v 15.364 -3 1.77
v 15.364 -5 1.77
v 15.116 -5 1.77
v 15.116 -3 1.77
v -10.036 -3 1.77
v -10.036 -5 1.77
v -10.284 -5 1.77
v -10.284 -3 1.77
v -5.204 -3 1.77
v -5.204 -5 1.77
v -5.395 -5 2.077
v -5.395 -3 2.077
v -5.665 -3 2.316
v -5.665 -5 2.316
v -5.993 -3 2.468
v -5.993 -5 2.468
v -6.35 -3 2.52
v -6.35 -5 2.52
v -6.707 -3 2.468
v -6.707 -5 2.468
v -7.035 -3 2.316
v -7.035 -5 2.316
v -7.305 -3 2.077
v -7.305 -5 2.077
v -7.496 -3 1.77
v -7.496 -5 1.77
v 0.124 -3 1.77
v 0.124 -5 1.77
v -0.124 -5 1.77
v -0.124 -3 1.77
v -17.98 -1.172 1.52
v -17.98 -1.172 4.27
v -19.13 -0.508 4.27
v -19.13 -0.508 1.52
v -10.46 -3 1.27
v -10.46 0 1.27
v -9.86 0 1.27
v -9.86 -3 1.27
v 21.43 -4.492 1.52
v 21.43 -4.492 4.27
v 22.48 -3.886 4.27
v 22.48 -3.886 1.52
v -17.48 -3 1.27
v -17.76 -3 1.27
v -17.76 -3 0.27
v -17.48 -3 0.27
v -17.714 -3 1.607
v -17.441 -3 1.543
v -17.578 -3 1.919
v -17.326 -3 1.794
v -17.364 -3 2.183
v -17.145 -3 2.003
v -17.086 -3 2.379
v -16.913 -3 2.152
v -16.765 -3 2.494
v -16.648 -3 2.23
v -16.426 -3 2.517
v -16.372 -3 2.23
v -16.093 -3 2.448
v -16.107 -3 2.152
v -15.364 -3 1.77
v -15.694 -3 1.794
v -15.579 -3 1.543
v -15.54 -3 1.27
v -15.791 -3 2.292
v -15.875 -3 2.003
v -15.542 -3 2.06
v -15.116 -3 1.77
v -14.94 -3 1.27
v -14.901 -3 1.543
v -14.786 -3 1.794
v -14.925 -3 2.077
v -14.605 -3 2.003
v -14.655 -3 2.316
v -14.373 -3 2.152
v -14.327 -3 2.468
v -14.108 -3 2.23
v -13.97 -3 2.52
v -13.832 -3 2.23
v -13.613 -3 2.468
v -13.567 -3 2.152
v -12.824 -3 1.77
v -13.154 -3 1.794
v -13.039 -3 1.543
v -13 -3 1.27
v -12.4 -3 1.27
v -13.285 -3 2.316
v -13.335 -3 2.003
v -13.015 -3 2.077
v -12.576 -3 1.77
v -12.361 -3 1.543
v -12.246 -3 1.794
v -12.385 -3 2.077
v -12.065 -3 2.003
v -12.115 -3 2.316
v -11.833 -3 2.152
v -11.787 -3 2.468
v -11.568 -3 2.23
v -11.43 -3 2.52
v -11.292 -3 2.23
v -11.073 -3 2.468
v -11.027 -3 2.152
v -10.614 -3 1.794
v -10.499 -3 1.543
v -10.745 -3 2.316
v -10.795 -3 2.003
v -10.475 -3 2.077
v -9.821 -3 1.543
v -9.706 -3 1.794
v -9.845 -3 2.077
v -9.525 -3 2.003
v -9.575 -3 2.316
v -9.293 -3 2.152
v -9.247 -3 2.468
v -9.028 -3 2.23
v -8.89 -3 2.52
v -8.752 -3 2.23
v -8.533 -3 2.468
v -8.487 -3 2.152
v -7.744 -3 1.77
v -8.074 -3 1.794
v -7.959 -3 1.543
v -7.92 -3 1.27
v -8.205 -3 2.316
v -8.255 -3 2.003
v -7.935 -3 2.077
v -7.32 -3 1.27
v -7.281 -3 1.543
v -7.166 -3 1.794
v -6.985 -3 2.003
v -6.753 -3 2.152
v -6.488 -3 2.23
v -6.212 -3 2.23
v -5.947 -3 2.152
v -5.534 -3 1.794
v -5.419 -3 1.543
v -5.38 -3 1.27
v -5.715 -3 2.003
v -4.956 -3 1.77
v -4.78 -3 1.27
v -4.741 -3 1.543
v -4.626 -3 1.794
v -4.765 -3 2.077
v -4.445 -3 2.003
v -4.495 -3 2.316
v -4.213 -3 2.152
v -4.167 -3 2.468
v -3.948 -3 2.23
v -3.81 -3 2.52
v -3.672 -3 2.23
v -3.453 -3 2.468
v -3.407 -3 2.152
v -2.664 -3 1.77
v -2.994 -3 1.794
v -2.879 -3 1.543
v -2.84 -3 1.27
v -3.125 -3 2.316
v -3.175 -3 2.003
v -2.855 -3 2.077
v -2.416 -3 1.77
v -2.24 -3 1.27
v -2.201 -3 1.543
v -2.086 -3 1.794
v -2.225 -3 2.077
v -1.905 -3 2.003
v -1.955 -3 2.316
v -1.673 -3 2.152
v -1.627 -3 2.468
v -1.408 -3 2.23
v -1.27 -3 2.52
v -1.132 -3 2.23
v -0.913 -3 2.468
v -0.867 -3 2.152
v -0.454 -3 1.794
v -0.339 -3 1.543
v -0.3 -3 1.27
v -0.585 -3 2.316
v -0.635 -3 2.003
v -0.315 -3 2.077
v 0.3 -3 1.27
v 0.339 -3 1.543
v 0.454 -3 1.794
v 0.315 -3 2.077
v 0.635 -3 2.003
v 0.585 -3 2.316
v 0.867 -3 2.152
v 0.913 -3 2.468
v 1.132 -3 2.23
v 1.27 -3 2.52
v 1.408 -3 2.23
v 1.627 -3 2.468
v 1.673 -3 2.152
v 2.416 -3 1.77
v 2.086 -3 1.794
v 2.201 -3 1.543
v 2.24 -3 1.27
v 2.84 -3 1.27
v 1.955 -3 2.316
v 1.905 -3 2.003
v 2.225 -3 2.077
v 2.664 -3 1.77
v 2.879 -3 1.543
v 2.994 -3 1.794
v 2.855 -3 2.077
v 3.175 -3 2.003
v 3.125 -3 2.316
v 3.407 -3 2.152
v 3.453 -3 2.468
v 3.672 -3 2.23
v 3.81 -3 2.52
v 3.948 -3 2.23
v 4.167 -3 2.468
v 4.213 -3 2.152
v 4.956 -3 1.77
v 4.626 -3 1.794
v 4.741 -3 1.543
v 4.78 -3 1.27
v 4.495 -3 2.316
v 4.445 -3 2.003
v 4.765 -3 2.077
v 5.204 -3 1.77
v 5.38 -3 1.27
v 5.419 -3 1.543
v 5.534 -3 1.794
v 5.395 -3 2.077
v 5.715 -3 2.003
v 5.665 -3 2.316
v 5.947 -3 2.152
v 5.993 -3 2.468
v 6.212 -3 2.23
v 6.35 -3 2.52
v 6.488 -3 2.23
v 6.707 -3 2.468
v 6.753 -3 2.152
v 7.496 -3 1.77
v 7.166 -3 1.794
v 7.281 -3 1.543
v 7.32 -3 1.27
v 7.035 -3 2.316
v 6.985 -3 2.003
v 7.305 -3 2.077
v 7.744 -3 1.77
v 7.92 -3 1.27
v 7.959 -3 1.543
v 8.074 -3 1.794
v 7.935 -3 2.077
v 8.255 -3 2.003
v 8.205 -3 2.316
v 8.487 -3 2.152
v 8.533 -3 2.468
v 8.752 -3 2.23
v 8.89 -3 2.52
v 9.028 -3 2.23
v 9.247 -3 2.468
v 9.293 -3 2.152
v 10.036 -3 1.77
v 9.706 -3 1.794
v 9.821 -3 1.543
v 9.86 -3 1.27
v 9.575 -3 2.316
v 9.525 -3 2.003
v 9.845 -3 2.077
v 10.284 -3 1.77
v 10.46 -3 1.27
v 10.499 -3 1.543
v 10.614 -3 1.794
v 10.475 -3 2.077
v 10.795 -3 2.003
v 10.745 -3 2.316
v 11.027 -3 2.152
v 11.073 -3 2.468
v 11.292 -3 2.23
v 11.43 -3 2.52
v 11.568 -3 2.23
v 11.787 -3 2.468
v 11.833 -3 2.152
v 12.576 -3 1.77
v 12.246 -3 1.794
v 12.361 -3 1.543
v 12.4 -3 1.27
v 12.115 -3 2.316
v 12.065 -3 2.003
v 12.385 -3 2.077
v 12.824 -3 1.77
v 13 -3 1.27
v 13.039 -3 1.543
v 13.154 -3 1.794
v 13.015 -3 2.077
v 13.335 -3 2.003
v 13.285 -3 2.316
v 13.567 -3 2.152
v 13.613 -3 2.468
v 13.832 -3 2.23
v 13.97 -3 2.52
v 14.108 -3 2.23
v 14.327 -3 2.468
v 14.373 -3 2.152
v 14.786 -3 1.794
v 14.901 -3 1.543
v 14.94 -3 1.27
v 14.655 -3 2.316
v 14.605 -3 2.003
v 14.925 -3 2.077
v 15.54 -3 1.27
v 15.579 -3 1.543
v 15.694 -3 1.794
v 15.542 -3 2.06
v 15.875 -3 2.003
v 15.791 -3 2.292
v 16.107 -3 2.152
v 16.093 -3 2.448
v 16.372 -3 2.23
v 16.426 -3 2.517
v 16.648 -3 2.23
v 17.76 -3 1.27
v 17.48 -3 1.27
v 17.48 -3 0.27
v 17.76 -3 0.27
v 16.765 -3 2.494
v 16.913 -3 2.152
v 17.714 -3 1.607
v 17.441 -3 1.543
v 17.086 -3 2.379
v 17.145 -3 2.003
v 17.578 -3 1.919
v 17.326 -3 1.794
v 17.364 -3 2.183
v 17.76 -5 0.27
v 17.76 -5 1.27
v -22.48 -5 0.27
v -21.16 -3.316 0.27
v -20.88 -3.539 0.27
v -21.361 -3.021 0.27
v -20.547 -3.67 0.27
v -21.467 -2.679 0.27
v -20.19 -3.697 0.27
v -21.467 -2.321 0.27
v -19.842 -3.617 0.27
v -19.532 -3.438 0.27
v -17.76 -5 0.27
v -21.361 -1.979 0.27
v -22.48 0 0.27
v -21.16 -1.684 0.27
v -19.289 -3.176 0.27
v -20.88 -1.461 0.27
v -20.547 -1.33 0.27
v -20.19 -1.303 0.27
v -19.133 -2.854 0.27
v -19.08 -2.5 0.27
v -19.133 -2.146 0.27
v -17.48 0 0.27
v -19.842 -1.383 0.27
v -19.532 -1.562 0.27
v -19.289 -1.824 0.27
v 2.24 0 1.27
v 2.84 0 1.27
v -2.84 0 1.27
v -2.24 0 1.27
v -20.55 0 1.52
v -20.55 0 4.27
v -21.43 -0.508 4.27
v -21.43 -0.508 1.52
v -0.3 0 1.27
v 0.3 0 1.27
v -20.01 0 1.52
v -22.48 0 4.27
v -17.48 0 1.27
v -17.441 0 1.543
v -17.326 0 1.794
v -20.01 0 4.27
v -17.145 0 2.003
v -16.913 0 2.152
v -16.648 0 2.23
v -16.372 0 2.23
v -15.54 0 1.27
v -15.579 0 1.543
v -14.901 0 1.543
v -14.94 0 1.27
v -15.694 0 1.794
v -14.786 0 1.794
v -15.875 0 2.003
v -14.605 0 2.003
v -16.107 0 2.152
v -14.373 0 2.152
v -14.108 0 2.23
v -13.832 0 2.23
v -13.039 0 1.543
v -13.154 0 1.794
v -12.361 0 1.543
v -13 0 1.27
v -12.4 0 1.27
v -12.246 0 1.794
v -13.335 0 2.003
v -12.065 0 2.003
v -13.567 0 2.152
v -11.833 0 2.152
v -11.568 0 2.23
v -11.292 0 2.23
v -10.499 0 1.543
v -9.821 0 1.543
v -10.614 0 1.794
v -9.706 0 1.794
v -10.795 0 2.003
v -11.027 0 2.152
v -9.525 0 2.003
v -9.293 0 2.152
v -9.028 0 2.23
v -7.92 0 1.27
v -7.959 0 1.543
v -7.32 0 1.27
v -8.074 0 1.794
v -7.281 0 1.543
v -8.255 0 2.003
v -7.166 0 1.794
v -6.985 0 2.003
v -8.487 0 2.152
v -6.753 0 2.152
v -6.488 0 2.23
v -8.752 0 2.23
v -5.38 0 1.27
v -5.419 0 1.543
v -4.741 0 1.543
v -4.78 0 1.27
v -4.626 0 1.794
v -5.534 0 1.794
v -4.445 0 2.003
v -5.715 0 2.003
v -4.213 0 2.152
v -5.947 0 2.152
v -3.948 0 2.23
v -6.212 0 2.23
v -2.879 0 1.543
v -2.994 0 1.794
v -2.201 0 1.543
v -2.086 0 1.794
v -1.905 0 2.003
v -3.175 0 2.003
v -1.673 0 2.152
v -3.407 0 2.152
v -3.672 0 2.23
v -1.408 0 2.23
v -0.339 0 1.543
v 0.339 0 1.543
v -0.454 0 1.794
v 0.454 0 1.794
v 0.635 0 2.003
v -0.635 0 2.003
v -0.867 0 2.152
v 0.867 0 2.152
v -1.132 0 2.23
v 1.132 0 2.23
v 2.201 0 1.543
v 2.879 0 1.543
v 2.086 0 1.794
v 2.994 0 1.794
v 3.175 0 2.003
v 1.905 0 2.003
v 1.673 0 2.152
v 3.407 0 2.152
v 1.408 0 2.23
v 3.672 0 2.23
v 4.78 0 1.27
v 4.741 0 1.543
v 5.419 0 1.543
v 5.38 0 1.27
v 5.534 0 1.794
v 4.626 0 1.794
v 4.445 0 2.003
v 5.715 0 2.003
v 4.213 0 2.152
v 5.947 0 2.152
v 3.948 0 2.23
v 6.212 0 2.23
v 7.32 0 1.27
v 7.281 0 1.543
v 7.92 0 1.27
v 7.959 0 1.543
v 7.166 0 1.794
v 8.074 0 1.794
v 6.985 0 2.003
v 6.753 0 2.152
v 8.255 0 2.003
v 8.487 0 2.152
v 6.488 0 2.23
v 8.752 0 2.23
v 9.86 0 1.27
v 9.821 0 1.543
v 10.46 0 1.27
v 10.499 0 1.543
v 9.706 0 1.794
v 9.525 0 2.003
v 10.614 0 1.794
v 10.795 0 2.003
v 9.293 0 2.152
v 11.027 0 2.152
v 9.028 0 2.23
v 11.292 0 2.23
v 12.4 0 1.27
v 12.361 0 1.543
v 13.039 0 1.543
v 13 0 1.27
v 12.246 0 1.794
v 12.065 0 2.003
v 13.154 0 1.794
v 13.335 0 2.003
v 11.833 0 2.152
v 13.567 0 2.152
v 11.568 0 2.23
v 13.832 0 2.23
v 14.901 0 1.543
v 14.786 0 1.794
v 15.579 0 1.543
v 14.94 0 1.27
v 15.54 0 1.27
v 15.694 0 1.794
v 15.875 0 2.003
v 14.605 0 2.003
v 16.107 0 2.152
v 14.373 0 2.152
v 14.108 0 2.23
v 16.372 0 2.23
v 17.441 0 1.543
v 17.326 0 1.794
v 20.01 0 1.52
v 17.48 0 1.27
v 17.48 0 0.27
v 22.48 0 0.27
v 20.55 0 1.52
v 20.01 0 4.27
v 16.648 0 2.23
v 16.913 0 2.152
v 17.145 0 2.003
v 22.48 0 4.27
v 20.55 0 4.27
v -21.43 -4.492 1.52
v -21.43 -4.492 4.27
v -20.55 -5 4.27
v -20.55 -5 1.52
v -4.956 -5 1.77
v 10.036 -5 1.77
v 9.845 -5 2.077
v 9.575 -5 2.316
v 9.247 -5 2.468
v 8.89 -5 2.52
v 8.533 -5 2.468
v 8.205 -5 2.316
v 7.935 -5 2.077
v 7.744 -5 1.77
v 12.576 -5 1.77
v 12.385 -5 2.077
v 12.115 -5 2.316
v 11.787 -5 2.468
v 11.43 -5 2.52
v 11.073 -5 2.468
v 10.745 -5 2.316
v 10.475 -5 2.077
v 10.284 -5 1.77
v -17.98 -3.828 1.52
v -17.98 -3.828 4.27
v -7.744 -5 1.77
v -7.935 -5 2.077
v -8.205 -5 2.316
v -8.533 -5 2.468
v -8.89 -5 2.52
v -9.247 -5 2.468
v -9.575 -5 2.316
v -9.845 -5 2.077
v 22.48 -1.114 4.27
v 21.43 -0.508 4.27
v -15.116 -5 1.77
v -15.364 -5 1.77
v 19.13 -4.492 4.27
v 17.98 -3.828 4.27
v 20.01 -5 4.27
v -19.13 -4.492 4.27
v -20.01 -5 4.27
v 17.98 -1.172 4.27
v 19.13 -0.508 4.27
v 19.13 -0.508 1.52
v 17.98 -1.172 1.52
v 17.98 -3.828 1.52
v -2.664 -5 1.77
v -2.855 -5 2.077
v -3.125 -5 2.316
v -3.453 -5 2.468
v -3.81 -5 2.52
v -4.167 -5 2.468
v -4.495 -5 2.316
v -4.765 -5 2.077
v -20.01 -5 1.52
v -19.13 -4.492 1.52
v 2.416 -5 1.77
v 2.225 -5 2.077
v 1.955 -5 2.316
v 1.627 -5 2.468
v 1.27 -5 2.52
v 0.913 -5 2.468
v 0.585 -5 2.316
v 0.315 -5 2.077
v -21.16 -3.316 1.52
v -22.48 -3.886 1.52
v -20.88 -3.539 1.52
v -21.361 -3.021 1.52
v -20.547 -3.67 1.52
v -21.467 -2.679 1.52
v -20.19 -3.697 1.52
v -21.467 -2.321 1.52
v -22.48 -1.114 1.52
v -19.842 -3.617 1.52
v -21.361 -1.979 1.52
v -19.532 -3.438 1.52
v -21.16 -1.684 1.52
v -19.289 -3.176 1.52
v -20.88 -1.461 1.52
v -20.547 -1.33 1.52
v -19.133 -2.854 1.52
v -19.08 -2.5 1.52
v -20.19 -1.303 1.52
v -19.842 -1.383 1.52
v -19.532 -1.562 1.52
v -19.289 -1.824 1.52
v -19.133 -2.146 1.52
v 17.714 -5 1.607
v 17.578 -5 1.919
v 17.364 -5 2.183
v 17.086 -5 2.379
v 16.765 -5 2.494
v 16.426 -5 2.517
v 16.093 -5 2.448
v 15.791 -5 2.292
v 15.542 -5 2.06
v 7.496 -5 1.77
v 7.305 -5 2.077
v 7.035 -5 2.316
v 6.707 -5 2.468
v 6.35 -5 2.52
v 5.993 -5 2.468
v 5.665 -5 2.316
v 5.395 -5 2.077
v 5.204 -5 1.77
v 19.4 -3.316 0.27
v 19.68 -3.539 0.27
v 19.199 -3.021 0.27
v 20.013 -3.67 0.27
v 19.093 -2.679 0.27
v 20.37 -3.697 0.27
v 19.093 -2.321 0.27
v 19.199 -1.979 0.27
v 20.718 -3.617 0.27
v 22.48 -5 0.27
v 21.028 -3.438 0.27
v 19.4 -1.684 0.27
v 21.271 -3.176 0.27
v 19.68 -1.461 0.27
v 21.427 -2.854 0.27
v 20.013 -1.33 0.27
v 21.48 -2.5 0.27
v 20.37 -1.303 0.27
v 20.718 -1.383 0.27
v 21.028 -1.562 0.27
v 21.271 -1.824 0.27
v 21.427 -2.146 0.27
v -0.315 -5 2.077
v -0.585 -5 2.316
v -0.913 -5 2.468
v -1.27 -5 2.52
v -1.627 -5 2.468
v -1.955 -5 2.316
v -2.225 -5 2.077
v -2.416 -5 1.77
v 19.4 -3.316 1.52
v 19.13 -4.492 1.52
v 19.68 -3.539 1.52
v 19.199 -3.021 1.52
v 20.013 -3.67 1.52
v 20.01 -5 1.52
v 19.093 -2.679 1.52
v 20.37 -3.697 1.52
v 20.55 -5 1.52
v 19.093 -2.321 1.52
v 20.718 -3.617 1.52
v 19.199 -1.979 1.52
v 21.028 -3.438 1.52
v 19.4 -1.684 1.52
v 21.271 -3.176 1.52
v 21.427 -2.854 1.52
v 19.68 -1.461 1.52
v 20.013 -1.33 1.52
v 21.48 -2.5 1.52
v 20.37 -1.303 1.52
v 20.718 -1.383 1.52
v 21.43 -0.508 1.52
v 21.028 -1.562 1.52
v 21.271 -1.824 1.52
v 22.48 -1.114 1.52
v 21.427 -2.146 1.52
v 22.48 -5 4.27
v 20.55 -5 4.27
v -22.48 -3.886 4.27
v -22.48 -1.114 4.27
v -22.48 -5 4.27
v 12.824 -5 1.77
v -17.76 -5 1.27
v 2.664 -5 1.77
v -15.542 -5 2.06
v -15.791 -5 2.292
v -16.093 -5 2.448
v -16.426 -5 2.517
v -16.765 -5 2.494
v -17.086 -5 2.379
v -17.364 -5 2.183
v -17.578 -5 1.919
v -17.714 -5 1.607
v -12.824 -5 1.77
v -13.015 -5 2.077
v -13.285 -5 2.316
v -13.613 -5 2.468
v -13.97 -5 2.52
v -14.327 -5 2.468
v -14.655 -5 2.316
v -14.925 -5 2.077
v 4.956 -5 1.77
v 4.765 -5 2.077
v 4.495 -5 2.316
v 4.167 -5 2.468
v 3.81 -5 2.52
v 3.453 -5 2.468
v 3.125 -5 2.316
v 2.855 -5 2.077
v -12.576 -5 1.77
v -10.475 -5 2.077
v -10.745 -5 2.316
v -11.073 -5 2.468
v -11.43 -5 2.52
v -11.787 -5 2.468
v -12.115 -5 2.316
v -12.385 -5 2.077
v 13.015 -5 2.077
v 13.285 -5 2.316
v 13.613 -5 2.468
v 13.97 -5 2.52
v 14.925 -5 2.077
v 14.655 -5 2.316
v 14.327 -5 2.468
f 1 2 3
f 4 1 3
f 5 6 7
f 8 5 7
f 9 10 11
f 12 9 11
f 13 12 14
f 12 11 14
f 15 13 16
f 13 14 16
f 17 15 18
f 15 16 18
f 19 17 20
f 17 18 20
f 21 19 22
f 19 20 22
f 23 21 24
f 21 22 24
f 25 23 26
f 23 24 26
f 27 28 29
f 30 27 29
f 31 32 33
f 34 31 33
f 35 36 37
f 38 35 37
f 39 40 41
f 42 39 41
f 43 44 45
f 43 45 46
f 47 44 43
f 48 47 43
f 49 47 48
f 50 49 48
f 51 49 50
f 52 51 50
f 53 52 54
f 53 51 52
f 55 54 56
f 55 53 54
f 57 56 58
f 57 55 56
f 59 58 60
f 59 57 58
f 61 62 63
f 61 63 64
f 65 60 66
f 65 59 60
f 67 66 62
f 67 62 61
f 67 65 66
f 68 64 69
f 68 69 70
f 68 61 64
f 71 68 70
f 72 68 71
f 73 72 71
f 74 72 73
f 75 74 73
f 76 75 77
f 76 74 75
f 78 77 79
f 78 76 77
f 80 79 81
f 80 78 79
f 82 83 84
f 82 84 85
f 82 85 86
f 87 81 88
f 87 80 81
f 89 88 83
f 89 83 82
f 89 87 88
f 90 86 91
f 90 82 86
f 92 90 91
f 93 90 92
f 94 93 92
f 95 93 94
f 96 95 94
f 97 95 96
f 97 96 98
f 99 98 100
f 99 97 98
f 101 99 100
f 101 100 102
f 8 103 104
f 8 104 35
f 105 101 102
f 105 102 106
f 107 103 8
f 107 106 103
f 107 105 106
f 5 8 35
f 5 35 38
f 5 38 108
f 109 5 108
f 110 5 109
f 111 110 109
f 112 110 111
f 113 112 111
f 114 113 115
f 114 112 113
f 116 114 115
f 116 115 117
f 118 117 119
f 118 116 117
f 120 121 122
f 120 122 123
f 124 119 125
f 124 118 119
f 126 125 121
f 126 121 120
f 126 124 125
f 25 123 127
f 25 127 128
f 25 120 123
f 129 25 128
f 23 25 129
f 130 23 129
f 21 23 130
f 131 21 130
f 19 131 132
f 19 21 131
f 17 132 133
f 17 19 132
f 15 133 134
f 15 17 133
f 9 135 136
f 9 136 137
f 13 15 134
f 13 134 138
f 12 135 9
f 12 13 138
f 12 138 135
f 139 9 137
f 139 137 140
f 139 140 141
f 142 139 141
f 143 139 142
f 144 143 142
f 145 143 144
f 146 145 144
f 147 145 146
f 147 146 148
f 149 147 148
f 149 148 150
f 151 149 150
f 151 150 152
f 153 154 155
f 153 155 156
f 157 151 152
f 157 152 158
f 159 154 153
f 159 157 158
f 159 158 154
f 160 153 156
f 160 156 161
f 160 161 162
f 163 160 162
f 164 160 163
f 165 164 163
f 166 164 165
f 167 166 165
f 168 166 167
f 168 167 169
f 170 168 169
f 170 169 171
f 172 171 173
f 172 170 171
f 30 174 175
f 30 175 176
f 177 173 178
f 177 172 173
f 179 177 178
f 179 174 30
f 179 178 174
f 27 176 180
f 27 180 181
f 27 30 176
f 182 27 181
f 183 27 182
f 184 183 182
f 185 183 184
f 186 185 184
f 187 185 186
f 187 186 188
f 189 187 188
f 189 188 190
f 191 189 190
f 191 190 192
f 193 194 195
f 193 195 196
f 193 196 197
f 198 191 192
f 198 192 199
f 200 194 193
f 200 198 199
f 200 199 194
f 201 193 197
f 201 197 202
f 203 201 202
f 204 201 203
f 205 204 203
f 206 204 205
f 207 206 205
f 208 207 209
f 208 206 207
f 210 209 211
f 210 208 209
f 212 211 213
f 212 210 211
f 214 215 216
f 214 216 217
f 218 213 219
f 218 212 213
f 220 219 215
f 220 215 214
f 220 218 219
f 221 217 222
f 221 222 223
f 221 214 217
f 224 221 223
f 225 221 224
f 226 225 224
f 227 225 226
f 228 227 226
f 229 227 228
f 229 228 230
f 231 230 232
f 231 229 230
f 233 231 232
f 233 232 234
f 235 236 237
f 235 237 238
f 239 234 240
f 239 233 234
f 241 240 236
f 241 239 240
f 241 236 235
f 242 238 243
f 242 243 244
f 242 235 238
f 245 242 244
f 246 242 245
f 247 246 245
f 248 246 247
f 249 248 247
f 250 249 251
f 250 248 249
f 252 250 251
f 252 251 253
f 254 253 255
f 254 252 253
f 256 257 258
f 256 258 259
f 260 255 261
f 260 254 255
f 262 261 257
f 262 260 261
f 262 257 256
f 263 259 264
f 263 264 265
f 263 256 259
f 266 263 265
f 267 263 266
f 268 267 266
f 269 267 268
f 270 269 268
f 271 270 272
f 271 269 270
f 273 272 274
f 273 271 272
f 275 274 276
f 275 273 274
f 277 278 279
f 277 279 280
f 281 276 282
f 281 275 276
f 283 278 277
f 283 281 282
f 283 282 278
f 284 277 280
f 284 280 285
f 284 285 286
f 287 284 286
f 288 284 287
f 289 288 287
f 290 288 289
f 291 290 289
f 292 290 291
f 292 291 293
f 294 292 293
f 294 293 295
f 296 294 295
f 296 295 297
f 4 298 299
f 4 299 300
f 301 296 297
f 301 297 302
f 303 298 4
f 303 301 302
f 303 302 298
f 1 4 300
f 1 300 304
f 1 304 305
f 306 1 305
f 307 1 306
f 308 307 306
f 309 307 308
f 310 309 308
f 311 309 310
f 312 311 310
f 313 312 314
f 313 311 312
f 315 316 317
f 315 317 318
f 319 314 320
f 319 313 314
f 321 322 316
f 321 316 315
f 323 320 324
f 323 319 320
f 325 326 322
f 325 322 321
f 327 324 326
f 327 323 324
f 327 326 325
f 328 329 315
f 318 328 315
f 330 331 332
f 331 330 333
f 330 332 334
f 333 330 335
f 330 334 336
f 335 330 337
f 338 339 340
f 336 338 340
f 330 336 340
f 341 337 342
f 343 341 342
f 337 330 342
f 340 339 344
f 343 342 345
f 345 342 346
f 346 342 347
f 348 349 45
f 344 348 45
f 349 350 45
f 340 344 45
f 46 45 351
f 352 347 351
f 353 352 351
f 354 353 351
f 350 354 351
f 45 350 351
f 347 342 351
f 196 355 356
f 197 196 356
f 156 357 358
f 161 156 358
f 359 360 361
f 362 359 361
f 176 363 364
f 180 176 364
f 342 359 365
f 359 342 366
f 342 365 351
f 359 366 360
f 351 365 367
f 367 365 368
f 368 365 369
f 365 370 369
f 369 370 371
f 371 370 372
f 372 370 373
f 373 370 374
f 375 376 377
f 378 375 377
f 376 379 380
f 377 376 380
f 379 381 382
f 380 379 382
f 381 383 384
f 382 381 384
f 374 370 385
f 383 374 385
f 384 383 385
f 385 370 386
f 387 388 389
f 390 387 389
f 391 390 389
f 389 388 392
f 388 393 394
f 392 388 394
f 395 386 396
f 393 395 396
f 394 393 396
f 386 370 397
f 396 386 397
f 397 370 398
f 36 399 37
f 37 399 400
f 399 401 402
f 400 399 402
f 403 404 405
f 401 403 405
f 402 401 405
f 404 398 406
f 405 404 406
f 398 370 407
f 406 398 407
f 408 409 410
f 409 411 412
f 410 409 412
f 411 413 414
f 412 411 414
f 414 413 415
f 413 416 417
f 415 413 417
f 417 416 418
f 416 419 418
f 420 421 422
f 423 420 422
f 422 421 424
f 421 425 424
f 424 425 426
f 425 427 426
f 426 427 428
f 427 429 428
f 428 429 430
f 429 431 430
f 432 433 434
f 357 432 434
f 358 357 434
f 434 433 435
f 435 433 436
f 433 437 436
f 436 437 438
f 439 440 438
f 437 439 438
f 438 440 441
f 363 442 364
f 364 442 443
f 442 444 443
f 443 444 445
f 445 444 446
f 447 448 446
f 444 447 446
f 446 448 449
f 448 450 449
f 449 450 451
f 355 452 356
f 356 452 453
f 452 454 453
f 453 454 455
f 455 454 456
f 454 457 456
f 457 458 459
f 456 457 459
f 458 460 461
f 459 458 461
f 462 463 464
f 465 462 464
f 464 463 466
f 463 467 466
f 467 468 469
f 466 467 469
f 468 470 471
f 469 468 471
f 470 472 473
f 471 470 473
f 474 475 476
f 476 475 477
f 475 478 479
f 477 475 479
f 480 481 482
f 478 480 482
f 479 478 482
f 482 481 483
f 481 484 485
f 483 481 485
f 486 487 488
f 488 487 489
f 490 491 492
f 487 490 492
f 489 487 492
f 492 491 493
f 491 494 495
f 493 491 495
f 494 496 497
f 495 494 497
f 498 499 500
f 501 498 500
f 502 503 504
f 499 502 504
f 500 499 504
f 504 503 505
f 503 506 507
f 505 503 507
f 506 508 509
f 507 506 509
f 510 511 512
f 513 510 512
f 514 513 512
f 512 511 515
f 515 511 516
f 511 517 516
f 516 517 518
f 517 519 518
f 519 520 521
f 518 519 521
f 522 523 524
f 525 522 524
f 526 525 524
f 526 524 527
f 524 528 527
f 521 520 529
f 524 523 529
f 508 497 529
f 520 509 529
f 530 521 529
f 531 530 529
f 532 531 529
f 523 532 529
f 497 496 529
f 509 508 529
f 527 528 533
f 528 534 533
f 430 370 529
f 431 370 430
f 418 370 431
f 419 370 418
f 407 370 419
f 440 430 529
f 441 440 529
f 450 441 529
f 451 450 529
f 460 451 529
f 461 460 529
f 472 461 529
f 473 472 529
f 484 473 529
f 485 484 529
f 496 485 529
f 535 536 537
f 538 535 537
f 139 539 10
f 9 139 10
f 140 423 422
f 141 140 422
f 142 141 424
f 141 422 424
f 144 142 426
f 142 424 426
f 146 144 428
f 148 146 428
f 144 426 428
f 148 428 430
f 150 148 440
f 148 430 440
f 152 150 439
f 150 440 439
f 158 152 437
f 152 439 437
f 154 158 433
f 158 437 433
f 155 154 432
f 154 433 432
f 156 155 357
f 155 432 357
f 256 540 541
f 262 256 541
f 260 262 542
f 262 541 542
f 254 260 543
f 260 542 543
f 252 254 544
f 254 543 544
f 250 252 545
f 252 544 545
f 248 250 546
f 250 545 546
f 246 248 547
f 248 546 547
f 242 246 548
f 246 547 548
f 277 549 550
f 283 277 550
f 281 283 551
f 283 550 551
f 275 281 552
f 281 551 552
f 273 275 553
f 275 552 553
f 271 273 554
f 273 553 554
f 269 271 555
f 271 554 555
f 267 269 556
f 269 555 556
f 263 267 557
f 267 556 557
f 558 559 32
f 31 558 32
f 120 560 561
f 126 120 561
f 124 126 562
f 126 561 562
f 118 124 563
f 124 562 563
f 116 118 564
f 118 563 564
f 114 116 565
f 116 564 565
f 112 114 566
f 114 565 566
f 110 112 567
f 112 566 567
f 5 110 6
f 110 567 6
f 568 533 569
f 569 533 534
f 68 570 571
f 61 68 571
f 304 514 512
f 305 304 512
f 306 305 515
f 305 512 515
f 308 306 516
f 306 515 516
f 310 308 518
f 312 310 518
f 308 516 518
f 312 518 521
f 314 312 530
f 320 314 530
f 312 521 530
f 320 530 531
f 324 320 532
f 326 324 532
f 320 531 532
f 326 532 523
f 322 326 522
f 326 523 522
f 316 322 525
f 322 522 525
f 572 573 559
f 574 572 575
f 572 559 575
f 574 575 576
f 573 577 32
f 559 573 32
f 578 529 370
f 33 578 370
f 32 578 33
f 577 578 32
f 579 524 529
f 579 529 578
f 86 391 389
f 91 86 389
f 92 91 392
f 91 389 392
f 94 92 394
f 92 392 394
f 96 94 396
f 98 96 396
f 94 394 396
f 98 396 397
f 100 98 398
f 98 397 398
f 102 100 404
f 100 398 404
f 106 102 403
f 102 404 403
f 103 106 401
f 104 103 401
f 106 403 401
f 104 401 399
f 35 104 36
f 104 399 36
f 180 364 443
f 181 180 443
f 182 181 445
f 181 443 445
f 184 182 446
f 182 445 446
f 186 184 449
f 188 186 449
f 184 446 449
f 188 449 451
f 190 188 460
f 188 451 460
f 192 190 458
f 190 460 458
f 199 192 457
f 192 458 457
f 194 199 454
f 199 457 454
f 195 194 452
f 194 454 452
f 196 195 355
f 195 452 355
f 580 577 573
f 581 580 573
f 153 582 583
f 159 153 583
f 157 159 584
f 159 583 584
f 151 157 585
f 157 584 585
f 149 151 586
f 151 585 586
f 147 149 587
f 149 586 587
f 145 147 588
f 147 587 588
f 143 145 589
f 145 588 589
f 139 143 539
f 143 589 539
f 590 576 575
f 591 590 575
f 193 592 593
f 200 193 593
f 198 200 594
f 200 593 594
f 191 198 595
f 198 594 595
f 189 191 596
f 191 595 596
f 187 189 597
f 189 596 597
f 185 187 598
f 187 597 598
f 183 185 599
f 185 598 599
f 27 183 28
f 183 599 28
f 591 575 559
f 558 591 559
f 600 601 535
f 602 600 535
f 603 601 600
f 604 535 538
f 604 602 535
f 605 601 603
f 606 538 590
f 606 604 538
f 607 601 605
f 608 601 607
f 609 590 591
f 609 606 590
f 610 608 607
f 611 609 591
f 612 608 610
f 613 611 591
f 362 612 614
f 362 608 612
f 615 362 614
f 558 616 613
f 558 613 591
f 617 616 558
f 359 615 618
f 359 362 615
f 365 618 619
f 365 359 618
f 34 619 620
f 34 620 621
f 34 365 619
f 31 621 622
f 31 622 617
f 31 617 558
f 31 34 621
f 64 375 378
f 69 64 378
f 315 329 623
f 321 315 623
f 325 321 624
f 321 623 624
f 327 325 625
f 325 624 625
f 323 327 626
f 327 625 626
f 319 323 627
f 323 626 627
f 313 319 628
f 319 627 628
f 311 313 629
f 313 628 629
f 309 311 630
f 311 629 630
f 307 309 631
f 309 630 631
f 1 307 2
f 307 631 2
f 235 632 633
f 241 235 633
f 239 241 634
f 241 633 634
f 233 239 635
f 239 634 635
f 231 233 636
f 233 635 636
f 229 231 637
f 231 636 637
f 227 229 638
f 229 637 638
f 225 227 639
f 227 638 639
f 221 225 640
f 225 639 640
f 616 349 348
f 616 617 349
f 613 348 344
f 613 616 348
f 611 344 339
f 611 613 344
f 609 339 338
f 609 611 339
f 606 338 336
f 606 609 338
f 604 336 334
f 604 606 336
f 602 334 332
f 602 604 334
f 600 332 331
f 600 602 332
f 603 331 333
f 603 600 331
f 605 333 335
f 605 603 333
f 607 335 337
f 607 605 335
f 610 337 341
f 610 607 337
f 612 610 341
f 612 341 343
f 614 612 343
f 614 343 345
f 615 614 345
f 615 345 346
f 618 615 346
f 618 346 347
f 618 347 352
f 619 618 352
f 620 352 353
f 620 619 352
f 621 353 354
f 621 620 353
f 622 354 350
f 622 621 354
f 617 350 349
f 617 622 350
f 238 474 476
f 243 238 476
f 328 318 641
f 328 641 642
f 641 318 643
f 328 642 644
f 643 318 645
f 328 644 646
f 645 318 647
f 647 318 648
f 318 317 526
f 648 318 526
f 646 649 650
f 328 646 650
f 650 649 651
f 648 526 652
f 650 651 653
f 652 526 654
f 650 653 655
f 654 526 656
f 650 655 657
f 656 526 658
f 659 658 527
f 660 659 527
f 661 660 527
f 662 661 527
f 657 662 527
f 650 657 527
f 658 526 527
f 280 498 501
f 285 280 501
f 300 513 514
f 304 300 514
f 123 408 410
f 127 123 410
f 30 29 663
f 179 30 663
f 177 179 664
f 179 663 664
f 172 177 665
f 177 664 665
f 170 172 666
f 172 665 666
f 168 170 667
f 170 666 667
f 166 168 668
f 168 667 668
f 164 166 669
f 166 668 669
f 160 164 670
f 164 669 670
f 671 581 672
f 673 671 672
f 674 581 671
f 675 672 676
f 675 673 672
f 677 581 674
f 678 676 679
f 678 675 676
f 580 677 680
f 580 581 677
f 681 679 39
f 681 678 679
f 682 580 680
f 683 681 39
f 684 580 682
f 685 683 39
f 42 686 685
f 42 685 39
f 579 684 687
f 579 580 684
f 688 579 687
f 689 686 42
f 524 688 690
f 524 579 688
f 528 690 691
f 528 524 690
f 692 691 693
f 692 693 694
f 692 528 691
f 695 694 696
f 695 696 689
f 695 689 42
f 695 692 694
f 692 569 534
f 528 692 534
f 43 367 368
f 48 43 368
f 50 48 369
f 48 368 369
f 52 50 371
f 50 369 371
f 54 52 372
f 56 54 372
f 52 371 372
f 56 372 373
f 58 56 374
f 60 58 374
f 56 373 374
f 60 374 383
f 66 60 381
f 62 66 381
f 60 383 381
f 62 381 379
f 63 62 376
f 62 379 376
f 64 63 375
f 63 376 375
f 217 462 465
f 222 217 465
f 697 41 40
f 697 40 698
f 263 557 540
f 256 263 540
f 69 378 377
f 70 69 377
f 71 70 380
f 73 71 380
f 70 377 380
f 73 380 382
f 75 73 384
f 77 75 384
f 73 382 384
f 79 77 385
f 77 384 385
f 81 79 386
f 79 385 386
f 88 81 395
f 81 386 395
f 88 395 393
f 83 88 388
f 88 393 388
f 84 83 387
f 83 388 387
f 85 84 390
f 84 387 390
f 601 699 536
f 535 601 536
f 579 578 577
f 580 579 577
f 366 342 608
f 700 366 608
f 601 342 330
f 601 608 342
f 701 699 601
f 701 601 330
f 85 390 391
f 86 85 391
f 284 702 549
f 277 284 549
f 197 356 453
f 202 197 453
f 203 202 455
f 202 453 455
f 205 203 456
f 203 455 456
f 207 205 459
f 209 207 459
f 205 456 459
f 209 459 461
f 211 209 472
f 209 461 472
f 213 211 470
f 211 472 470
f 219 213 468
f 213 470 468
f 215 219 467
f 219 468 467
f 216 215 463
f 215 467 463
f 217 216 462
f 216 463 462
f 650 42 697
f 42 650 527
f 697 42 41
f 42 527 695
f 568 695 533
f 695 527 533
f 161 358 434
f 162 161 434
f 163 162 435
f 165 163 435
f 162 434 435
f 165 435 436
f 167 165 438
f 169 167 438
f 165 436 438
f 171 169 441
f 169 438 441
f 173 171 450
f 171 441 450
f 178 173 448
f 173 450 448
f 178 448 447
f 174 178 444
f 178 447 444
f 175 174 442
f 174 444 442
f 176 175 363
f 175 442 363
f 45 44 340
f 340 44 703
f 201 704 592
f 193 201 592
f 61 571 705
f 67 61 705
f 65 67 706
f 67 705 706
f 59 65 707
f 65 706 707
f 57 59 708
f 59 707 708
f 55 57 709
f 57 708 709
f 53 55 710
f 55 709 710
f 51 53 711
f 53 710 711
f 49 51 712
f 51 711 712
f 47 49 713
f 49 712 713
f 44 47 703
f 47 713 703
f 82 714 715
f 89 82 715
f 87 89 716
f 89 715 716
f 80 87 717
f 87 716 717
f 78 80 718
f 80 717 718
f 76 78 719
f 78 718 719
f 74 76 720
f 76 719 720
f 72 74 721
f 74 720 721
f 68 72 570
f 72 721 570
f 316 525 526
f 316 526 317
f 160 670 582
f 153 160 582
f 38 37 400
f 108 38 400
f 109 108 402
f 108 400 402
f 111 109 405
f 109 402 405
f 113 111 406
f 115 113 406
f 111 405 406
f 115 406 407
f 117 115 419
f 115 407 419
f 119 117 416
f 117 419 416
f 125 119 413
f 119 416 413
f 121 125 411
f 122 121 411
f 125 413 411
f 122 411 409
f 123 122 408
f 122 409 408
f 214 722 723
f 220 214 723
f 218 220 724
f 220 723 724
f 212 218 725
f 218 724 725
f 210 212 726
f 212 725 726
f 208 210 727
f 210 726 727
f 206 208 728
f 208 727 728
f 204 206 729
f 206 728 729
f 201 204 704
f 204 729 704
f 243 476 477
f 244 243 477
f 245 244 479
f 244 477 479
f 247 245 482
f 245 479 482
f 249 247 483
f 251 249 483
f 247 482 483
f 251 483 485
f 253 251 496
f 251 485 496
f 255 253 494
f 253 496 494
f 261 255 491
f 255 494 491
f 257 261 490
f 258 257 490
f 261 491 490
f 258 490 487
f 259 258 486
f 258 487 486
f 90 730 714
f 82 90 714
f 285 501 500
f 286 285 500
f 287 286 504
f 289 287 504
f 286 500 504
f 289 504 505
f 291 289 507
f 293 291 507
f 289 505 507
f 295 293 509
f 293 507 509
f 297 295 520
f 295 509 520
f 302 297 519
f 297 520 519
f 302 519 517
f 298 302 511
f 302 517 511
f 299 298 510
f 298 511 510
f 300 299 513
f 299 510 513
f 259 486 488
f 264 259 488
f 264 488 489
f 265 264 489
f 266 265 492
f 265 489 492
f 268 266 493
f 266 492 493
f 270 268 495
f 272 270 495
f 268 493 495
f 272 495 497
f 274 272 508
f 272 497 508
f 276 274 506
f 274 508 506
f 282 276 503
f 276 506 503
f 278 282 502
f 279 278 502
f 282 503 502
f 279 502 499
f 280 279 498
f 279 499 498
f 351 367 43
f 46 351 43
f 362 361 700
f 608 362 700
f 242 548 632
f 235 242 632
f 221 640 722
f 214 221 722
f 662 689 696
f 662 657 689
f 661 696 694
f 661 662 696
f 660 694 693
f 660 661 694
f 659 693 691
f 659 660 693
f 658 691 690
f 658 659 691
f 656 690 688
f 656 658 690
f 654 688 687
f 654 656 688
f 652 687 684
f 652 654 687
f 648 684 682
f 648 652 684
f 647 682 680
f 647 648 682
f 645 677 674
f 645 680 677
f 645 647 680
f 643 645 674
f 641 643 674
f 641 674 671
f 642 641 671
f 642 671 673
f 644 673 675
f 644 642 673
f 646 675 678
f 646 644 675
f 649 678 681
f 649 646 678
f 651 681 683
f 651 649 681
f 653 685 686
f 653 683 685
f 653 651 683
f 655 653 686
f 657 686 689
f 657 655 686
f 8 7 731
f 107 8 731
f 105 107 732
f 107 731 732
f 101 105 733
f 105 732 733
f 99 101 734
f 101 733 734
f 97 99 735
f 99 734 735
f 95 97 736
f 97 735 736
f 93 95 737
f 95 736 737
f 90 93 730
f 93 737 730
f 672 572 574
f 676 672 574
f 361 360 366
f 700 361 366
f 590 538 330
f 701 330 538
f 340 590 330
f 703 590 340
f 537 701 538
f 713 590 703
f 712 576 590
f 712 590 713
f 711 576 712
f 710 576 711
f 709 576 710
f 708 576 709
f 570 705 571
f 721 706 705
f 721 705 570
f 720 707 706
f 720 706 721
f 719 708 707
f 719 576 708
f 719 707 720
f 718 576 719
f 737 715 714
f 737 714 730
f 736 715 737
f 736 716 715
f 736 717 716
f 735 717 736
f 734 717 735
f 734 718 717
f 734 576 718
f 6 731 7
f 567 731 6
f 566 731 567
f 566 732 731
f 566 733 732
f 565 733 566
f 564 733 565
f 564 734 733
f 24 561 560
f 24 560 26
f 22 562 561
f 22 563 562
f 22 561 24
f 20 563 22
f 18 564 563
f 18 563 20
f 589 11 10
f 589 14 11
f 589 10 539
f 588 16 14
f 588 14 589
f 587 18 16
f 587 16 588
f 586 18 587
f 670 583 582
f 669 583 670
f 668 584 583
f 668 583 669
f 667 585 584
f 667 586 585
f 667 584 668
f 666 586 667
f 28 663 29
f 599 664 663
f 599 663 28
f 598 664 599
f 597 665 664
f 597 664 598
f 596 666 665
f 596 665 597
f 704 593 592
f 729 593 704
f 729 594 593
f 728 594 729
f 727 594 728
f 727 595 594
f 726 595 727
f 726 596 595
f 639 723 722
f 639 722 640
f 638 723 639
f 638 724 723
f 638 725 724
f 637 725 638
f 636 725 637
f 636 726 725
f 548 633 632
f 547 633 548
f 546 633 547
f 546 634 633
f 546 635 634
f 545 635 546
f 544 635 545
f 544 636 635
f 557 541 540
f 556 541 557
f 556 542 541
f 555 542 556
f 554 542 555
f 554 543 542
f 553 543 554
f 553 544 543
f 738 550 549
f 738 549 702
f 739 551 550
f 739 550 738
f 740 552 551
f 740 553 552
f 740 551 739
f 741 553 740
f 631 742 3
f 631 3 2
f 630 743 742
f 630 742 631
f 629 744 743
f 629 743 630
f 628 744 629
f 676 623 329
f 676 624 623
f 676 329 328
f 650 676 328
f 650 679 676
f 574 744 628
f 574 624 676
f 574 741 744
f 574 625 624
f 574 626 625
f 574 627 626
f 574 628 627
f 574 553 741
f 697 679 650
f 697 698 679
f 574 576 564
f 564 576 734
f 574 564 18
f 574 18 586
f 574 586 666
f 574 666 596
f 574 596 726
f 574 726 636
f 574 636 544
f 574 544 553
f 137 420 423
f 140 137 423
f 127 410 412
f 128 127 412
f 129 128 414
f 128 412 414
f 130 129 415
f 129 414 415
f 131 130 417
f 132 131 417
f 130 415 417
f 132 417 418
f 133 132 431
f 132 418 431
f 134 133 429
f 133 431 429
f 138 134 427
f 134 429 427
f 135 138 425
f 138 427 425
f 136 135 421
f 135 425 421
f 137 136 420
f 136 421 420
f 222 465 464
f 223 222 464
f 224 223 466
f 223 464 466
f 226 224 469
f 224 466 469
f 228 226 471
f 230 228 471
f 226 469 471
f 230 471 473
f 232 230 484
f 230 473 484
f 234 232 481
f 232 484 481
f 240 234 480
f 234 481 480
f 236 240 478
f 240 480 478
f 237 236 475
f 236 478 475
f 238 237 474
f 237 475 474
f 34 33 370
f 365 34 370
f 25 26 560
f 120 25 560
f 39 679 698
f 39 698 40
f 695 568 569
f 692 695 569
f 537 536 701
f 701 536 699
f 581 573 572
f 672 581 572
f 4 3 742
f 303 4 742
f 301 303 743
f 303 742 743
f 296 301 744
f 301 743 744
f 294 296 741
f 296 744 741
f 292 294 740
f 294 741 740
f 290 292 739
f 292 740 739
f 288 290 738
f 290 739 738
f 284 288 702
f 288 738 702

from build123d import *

# Parameters (mm, degrees)
F1_DEPTH = 5
F3_DEPTH = 2
F5_DEPTH = 2.75
F6_R     = 1.2
F7_DEPTH = 5
F8_DEPTH = 1


with BuildPart() as f1:
    # F0 (on Front) → F1 (new body)
    with BuildSketch(Plane.XZ):
        with BuildLine():
            ThreePointArc((-2.24, 1.27), (-1.27, 2.24), (-0.3, 1.27))
            Line((-0.3, 1.27), (0.3, 1.27))
            ThreePointArc((0.3, 1.27), (1.27, 2.24), (2.24, 1.27))
            Line((2.24, 1.27), (2.84, 1.27))
            ThreePointArc((2.84, 1.27), (3.81, 2.24), (4.78, 1.27))
            Line((4.78, 1.27), (5.38, 1.27))
            ThreePointArc((5.38, 1.27), (6.35, 2.24), (7.32, 1.27))
            Line((7.32, 1.27), (7.92, 1.27))
            ThreePointArc((7.92, 1.27), (8.89, 2.24), (9.86, 1.27))
            Line((9.86, 1.27), (10.46, 1.27))
            ThreePointArc((10.46, 1.27), (11.43, 2.24), (12.4, 1.27))
            Line((12.4, 1.27), (13, 1.27))
            ThreePointArc((13, 1.27), (13.97, 2.24), (14.94, 1.27))
            Line((14.94, 1.27), (15.54, 1.27))
            ThreePointArc((15.54, 1.27), (16.51, 2.24), (17.48, 1.27))
            Line((17.48, 1.27), (22.48, 1.27))
            Line((22.48, 1.27), (22.48, 4.27))
            Line((22.48, 4.27), (-22.48, 4.27))
            Line((-22.48, 4.27), (-22.48, 1.27))
            Line((-22.48, 1.27), (-17.48, 1.27))
            ThreePointArc((-17.48, 1.27), (-16.51, 2.24), (-15.54, 1.27))
            Line((-15.54, 1.27), (-14.94, 1.27))
            ThreePointArc((-14.94, 1.27), (-13.97, 2.24), (-13, 1.27))
            Line((-13, 1.27), (-12.4, 1.27))
            ThreePointArc((-12.4, 1.27), (-11.43, 2.24), (-10.46, 1.27))
            Line((-10.46, 1.27), (-9.86, 1.27))
            ThreePointArc((-9.86, 1.27), (-8.89, 2.24), (-7.92, 1.27))
            Line((-7.92, 1.27), (-7.32, 1.27))
            ThreePointArc((-7.32, 1.27), (-6.35, 2.24), (-5.38, 1.27))
            Line((-5.38, 1.27), (-4.78, 1.27))
            ThreePointArc((-4.78, 1.27), (-3.81, 2.24), (-2.84, 1.27))
            Line((-2.84, 1.27), (-2.24, 1.27))
        make_face()
    extrude(amount=F1_DEPTH)

    # F2 (on face) → F3 (cut)
    with BuildSketch(Plane.XZ.offset(5)):
        with BuildLine():
            Line((-16.51, 1.27), (-15.26, 1.27))
            ThreePointArc((-15.26, 1.27), (-15.2863671088, 1.5253870546), (-15.3643560763, 1.77))
            Line((-15.3643560763, 1.77), (-16.51, 1.77))
            Line((-16.51, 1.77), (-16.51, 1.27))
        make_face()
        with BuildLine():
            ThreePointArc((-15.3643560763, 1.77), (-17.7336328912, 1.0146129454), (-15.26, 1.27))
            Line((-15.26, 1.27), (-16.51, 1.27))
            Line((-16.51, 1.27), (-16.51, 1.77))
            Line((-16.51, 1.77), (-15.3643560763, 1.77))
        make_face()
        with BuildLine():
            ThreePointArc((-15.3643560763, 1.77), (-15.2863671088, 1.5253870546), (-15.26, 1.27))
            Line((-15.26, 1.27), (-15.22, 1.27))
            ThreePointArc((-15.22, 1.27), (-15.1936328912, 1.5253870546), (-15.1156439237, 1.77))
            Line((-15.1156439237, 1.77), (-15.3643560763, 1.77))
        make_face()
        with BuildLine():
            Line((-12.72, 1.27), (-15.22, 1.27))
            ThreePointArc((-15.22, 1.27), (-13.97, 0.02), (-12.72, 1.27))
        make_face()
        with BuildLine():
            ThreePointArc((-15.1156439237, 1.77), (-15.1936328912, 1.5253870546), (-15.22, 1.27))
            Line((-15.22, 1.27), (-12.72, 1.27))
            ThreePointArc((-12.72, 1.27), (-12.7463671088, 1.5253870546), (-12.8243560763, 1.77))
            Line((-12.8243560763, 1.77), (-15.1156439237, 1.77))
        make_face()
        with BuildLine():
            ThreePointArc((-12.8243560763, 1.77), (-13.97, 2.52), (-15.1156439237, 1.77))
            Line((-15.1156439237, 1.77), (-12.8243560763, 1.77))
        make_face()
        with BuildLine():
            ThreePointArc((-12.8243560763, 1.77), (-12.7463671088, 1.5253870546), (-12.72, 1.27))
            Line((-12.72, 1.27), (-12.68, 1.27))
            ThreePointArc((-12.68, 1.27), (-12.6536328912, 1.5253870546), (-12.5756439237, 1.77))
            Line((-12.5756439237, 1.77), (-12.8243560763, 1.77))
        make_face()
        with BuildLine():
            Line((-10.18, 1.27), (-12.68, 1.27))
            ThreePointArc((-12.68, 1.27), (-11.43, 0.02), (-10.18, 1.27))
        make_face()
        with BuildLine():
            ThreePointArc((-12.5756439237, 1.77), (-12.6536328912, 1.5253870546), (-12.68, 1.27))
            Line((-12.68, 1.27), (-10.18, 1.27))
            ThreePointArc((-10.18, 1.27), (-10.2063671088, 1.5253870546), (-10.2843560763, 1.77))
            Line((-10.2843560763, 1.77), (-12.5756439237, 1.77))
        make_face()
        with BuildLine():
            ThreePointArc((-10.2843560763, 1.77), (-11.43, 2.52), (-12.5756439237, 1.77))
            Line((-12.5756439237, 1.77), (-10.2843560763, 1.77))
        make_face()
        with BuildLine():
            ThreePointArc((-10.2843560763, 1.77), (-10.2063671088, 1.5253870546), (-10.18, 1.27))
            Line((-10.18, 1.27), (-10.14, 1.27))
            ThreePointArc((-10.14, 1.27), (-10.1136328912, 1.5253870546), (-10.0356439237, 1.77))
            Line((-10.0356439237, 1.77), (-10.2843560763, 1.77))
        make_face()
        with BuildLine():
            Line((-7.64, 1.27), (-10.14, 1.27))
            ThreePointArc((-10.14, 1.27), (-8.89, 0.02), (-7.64, 1.27))
        make_face()
        with BuildLine():
            ThreePointArc((-10.0356439237, 1.77), (-10.1136328912, 1.5253870546), (-10.14, 1.27))
            Line((-10.14, 1.27), (-7.64, 1.27))
            ThreePointArc((-7.64, 1.27), (-7.6663671088, 1.5253870546), (-7.7443560763, 1.77))
            Line((-7.7443560763, 1.77), (-10.0356439237, 1.77))
        make_face()
        with BuildLine():
            ThreePointArc((-7.7443560763, 1.77), (-8.89, 2.52), (-10.0356439237, 1.77))
            Line((-10.0356439237, 1.77), (-7.7443560763, 1.77))
        make_face()
        with BuildLine():
            ThreePointArc((-7.7443560763, 1.77), (-7.6663671088, 1.5253870546), (-7.64, 1.27))
            Line((-7.64, 1.27), (-7.6, 1.27))
            ThreePointArc((-7.6, 1.27), (-7.5736328912, 1.5253870546), (-7.4956439237, 1.77))
            Line((-7.4956439237, 1.77), (-7.7443560763, 1.77))
        make_face()
        with BuildLine():
            Line((-5.1, 1.27), (-7.6, 1.27))
            ThreePointArc((-7.6, 1.27), (-6.35, 0.02), (-5.1, 1.27))
        make_face()
        with BuildLine():
            ThreePointArc((-7.4956439237, 1.77), (-7.5736328912, 1.5253870546), (-7.6, 1.27))
            Line((-7.6, 1.27), (-5.1, 1.27))
            ThreePointArc((-5.1, 1.27), (-5.1263671088, 1.5253870546), (-5.2043560763, 1.77))
            Line((-5.2043560763, 1.77), (-7.4956439237, 1.77))
        make_face()
        with BuildLine():
            ThreePointArc((-5.2043560763, 1.77), (-6.35, 2.52), (-7.4956439237, 1.77))
            Line((-7.4956439237, 1.77), (-5.2043560763, 1.77))
        make_face()
        with BuildLine():
            ThreePointArc((-5.2043560763, 1.77), (-5.1263671088, 1.5253870546), (-5.1, 1.27))
            Line((-5.1, 1.27), (-5.06, 1.27))
            ThreePointArc((-5.06, 1.27), (-5.0336328912, 1.5253870546), (-4.9556439237, 1.77))
            Line((-4.9556439237, 1.77), (-5.2043560763, 1.77))
        make_face()
        with BuildLine():
            Line((-2.56, 1.27), (-5.06, 1.27))
            ThreePointArc((-5.06, 1.27), (-3.81, 0.02), (-2.56, 1.27))
        make_face()
        with BuildLine():
            ThreePointArc((-4.9556439237, 1.77), (-5.0336328912, 1.5253870546), (-5.06, 1.27))
            Line((-5.06, 1.27), (-2.56, 1.27))
            ThreePointArc((-2.56, 1.27), (-2.5863671088, 1.5253870546), (-2.6643560763, 1.77))
            Line((-2.6643560763, 1.77), (-4.9556439237, 1.77))
        make_face()
        with BuildLine():
            ThreePointArc((-2.6643560763, 1.77), (-3.81, 2.52), (-4.9556439237, 1.77))
            Line((-4.9556439237, 1.77), (-2.6643560763, 1.77))
        make_face()
        with BuildLine():
            ThreePointArc((-2.6643560763, 1.77), (-2.5863671088, 1.5253870546), (-2.56, 1.27))
            Line((-2.56, 1.27), (-2.52, 1.27))
            ThreePointArc((-2.52, 1.27), (-2.4936328912, 1.5253870546), (-2.4156439237, 1.77))
            Line((-2.4156439237, 1.77), (-2.6643560763, 1.77))
        make_face()
        with BuildLine():
            Line((-0.02, 1.27), (-2.52, 1.27))
            ThreePointArc((-2.52, 1.27), (-1.27, 0.02), (-0.02, 1.27))
        make_face()
        with BuildLine():
            ThreePointArc((-2.4156439237, 1.77), (-2.4936328912, 1.5253870546), (-2.52, 1.27))
            Line((-2.52, 1.27), (-0.02, 1.27))
            ThreePointArc((-0.02, 1.27), (-0.0463671088, 1.5253870546), (-0.1243560763, 1.77))
            Line((-0.1243560763, 1.77), (-2.4156439237, 1.77))
        make_face()
        with BuildLine():
            ThreePointArc((-0.1243560763, 1.77), (-1.27, 2.52), (-2.4156439237, 1.77))
            Line((-2.4156439237, 1.77), (-0.1243560763, 1.77))
        make_face()
        with BuildLine():
            ThreePointArc((-0.1243560763, 1.77), (-0.0463671088, 1.5253870546), (-0.02, 1.27))
            Line((-0.02, 1.27), (0.02, 1.27))
            ThreePointArc((0.02, 1.27), (0.0463671088, 1.5253870546), (0.1243560763, 1.77))
            Line((0.1243560763, 1.77), (-0.1243560763, 1.77))
        make_face()
        with BuildLine():
            Line((2.52, 1.27), (0.02, 1.27))
            ThreePointArc((0.02, 1.27), (1.27, 0.02), (2.52, 1.27))
        make_face()
        with BuildLine():
            ThreePointArc((0.1243560763, 1.77), (0.0463671088, 1.5253870546), (0.02, 1.27))
            Line((0.02, 1.27), (2.52, 1.27))
            ThreePointArc((2.52, 1.27), (2.4936328912, 1.5253870546), (2.4156439237, 1.77))
            Line((2.4156439237, 1.77), (0.1243560763, 1.77))
        make_face()
        with BuildLine():
            ThreePointArc((2.4156439237, 1.77), (1.27, 2.52), (0.1243560763, 1.77))
            Line((0.1243560763, 1.77), (2.4156439237, 1.77))
        make_face()
        with BuildLine():
            ThreePointArc((2.4156439237, 1.77), (2.4936328912, 1.5253870546), (2.52, 1.27))
            Line((2.52, 1.27), (2.56, 1.27))
            ThreePointArc((2.56, 1.27), (2.5863671088, 1.5253870546), (2.6643560763, 1.77))
            Line((2.6643560763, 1.77), (2.4156439237, 1.77))
        make_face()
        with BuildLine():
            Line((5.06, 1.27), (2.56, 1.27))
            ThreePointArc((2.56, 1.27), (3.81, 0.02), (5.06, 1.27))
        make_face()
        with BuildLine():
            ThreePointArc((2.6643560763, 1.77), (2.5863671088, 1.5253870546), (2.56, 1.27))
            Line((2.56, 1.27), (5.06, 1.27))
            ThreePointArc((5.06, 1.27), (5.0336328912, 1.5253870546), (4.9556439237, 1.77))
            Line((4.9556439237, 1.77), (2.6643560763, 1.77))
        make_face()
        with BuildLine():
            ThreePointArc((4.9556439237, 1.77), (3.81, 2.52), (2.6643560763, 1.77))
            Line((2.6643560763, 1.77), (4.9556439237, 1.77))
        make_face()
        with BuildLine():
            ThreePointArc((4.9556439237, 1.77), (5.0336328912, 1.5253870546), (5.06, 1.27))
            Line((5.06, 1.27), (5.1, 1.27))
            ThreePointArc((5.1, 1.27), (5.1263671088, 1.5253870546), (5.2043560763, 1.77))
            Line((5.2043560763, 1.77), (4.9556439237, 1.77))
        make_face()
        with BuildLine():
            Line((7.6, 1.27), (5.1, 1.27))
            ThreePointArc((5.1, 1.27), (6.35, 0.02), (7.6, 1.27))
        make_face()
        with BuildLine():
            ThreePointArc((5.2043560763, 1.77), (5.1263671088, 1.5253870546), (5.1, 1.27))
            Line((5.1, 1.27), (7.6, 1.27))
            ThreePointArc((7.6, 1.27), (7.5736328912, 1.5253870546), (7.4956439237, 1.77))
            Line((7.4956439237, 1.77), (5.2043560763, 1.77))
        make_face()
        with BuildLine():
            ThreePointArc((7.4956439237, 1.77), (6.35, 2.52), (5.2043560763, 1.77))
            Line((5.2043560763, 1.77), (7.4956439237, 1.77))
        make_face()
        with BuildLine():
            ThreePointArc((7.4956439237, 1.77), (7.5736328912, 1.5253870546), (7.6, 1.27))
            Line((7.6, 1.27), (7.64, 1.27))
            ThreePointArc((7.64, 1.27), (7.6663671088, 1.5253870546), (7.7443560763, 1.77))
            Line((7.7443560763, 1.77), (7.4956439237, 1.77))
        make_face()
        with BuildLine():
            Line((10.14, 1.27), (7.64, 1.27))
            ThreePointArc((7.64, 1.27), (8.89, 0.02), (10.14, 1.27))
        make_face()
        with BuildLine():
            ThreePointArc((7.7443560763, 1.77), (7.6663671088, 1.5253870546), (7.64, 1.27))
            Line((7.64, 1.27), (10.14, 1.27))
            ThreePointArc((10.14, 1.27), (10.1136328912, 1.5253870546), (10.0356439237, 1.77))
            Line((10.0356439237, 1.77), (7.7443560763, 1.77))
        make_face()
        with BuildLine():
            ThreePointArc((10.0356439237, 1.77), (8.89, 2.52), (7.7443560763, 1.77))
            Line((7.7443560763, 1.77), (10.0356439237, 1.77))
        make_face()
        with BuildLine():
            ThreePointArc((10.0356439237, 1.77), (10.1136328912, 1.5253870546), (10.14, 1.27))
            Line((10.14, 1.27), (10.18, 1.27))
            ThreePointArc((10.18, 1.27), (10.2063671088, 1.5253870546), (10.2843560763, 1.77))
            Line((10.2843560763, 1.77), (10.0356439237, 1.77))
        make_face()
        with BuildLine():
            Line((12.68, 1.27), (10.18, 1.27))
            ThreePointArc((10.18, 1.27), (11.43, 0.02), (12.68, 1.27))
        make_face()
        with BuildLine():
            ThreePointArc((10.2843560763, 1.77), (10.2063671088, 1.5253870546), (10.18, 1.27))
            Line((10.18, 1.27), (12.68, 1.27))
            ThreePointArc((12.68, 1.27), (12.6536328912, 1.5253870546), (12.5756439237, 1.77))
            Line((12.5756439237, 1.77), (10.2843560763, 1.77))
        make_face()
        with BuildLine():
            ThreePointArc((12.5756439237, 1.77), (11.43, 2.52), (10.2843560763, 1.77))
            Line((10.2843560763, 1.77), (12.5756439237, 1.77))
        make_face()
        with BuildLine():
            ThreePointArc((12.5756439237, 1.77), (12.6536328912, 1.5253870546), (12.68, 1.27))
            Line((12.68, 1.27), (12.72, 1.27))
            ThreePointArc((12.72, 1.27), (12.7463671088, 1.5253870546), (12.8243560763, 1.77))
            Line((12.8243560763, 1.77), (12.5756439237, 1.77))
        make_face()
        with BuildLine():
            Line((15.22, 1.27), (12.72, 1.27))
            ThreePointArc((12.72, 1.27), (13.97, 0.02), (15.22, 1.27))
        make_face()
        with BuildLine():
            ThreePointArc((12.8243560763, 1.77), (12.7463671088, 1.5253870546), (12.72, 1.27))
            Line((12.72, 1.27), (15.22, 1.27))
            ThreePointArc((15.22, 1.27), (15.1936328912, 1.5253870546), (15.1156439237, 1.77))
            Line((15.1156439237, 1.77), (12.8243560763, 1.77))
        make_face()
        with BuildLine():
            ThreePointArc((15.1156439237, 1.77), (13.97, 2.52), (12.8243560763, 1.77))
            Line((12.8243560763, 1.77), (15.1156439237, 1.77))
        make_face()
        with BuildLine():
            ThreePointArc((15.1156439237, 1.77), (15.1936328912, 1.5253870546), (15.22, 1.27))
            Line((15.22, 1.27), (15.26, 1.27))
            ThreePointArc((15.26, 1.27), (15.2863671088, 1.5253870546), (15.3643560763, 1.77))
            Line((15.3643560763, 1.77), (15.1156439237, 1.77))
        make_face()
        with BuildLine():
            Line((16.51, 1.27), (15.26, 1.27))
            ThreePointArc((15.26, 1.27), (16.51, 0.02), (17.76, 1.27))
            ThreePointArc((17.76, 1.27), (16.7653870546, 2.4936328912), (15.3643560763, 1.77))
            Line((15.3643560763, 1.77), (16.51, 1.77))
            Line((16.51, 1.77), (16.51, 1.27))
        make_face()
        with BuildLine():
            ThreePointArc((15.3643560763, 1.77), (15.2863671088, 1.5253870546), (15.26, 1.27))
            Line((15.26, 1.27), (16.51, 1.27))
            Line((16.51, 1.27), (16.51, 1.77))
            Line((16.51, 1.77), (15.3643560763, 1.77))
        make_face()
    extrude(amount=-F3_DEPTH, mode=Mode.SUBTRACT)

    # F4 (on face) → F5 (cut)
    with BuildSketch(Plane.XY.offset(4.27)):
        with BuildLine():
            ThreePointArc((21.4299999725, -4.4918584446), (22.2718584208, -3.6500000137), (22.58, -2.5))
            ThreePointArc((22.58, -2.5), (22.271858109, -1.3499994462), (21.4299988924, -0.5081409318))
            ThreePointArc((21.4299988924, -0.5081409318), (20.280000147, -0.2), (19.1300013622, -0.5081407848))
            ThreePointArc((19.1300013622, -0.5081407848), (18.2881419645, -1.3499993189), (17.98, -2.5))
            ThreePointArc((17.98, -2.5), (18.2881415897, -3.6500000318), (19.1300000637, -4.4918584655))
            ThreePointArc((19.1300000637, -4.4918584655), (20.2800000209, -4.8), (21.4299999725, -4.4918584446))
        make_face()
        with BuildLine():
            Line((22.58, -3.8279056191), (22.58, -2.5))
            ThreePointArc((22.58, -2.5), (22.2718584208, -3.6500000137), (21.4299999725, -4.4918584446))
            Line((21.4299999725, -4.4918584446), (22.58, -3.8279056191))
        make_face()
        with BuildLine():
            ThreePointArc((21.4299988924, -0.5081409318), (22.271858109, -1.3499994462), (22.58, -2.5))
            Line((22.58, -2.5), (22.58, -1.1720943809))
            Line((22.58, -1.1720943809), (21.4299988924, -0.5081409318))
        make_face()
        with BuildLine():
            ThreePointArc((19.1300013622, -0.5081407848), (20.280000147, -0.2), (21.4299988924, -0.5081409318))
            Line((21.4299988924, -0.5081409318), (20.28, 0.1558112383))
            Line((20.28, 0.1558112383), (19.1300013622, -0.5081407848))
        make_face()
        with BuildLine():
            Line((20.28, -5.1558112383), (21.4299999725, -4.4918584446))
            ThreePointArc((21.4299999725, -4.4918584446), (20.2800000209, -4.8), (19.1300000637, -4.4918584655))
            Line((19.1300000637, -4.4918584655), (20.28, -5.1558112383))
        make_face()
        with BuildLine():
            ThreePointArc((17.98, -2.5), (18.2881419645, -1.3499993189), (19.1300013622, -0.5081407848))
            Line((19.1300013622, -0.5081407848), (17.98, -1.1720943809))
            Line((17.98, -1.1720943809), (17.98, -2.5))
        make_face()
        with BuildLine():
            Line((17.98, -3.8279056191), (19.1300000637, -4.4918584655))
            ThreePointArc((19.1300000637, -4.4918584655), (18.2881415897, -3.6500000318), (17.98, -2.5))
            Line((17.98, -2.5), (17.98, -3.8279056191))
        make_face()
        with BuildLine():
            ThreePointArc((-19.1300000861, -4.4918584784), (-18.2881415961, -3.650000043), (-17.98, -2.5))
            ThreePointArc((-17.98, -2.5), (-18.2881415051, -1.3500001146), (-19.1299997708, -0.5081417036))
            ThreePointArc((-19.1299997708, -0.5081417036), (-20.2799996458, -0.2), (-21.4299996157, -0.5081413494))
            ThreePointArc((-21.4299996157, -0.5081413494), (-22.2718583178, -1.3499998079), (-22.58, -2.5))
            ThreePointArc((-22.58, -2.5), (-22.2718584103, -3.6500000318), (-21.4299999363, -4.4918584655))
            ThreePointArc((-21.4299999363, -4.4918584655), (-20.2800000129, -4.8), (-19.1300000861, -4.4918584784))
        make_face()
        with BuildLine():
            Line((-17.98, -3.8279056191), (-17.98, -2.5))
            ThreePointArc((-17.98, -2.5), (-18.2881415961, -3.650000043), (-19.1300000861, -4.4918584784))
            Line((-19.1300000861, -4.4918584784), (-17.98, -3.8279056191))
        make_face()
        with BuildLine():
            ThreePointArc((-19.1299997708, -0.5081417036), (-18.2881415051, -1.3500001146), (-17.98, -2.5))
            Line((-17.98, -2.5), (-17.98, -1.1720943809))
            Line((-17.98, -1.1720943809), (-19.1299997708, -0.5081417036))
        make_face()
        with BuildLine():
            ThreePointArc((-21.4299996157, -0.5081413494), (-20.2799996458, -0.2), (-19.1299997708, -0.5081417036))
            Line((-19.1299997708, -0.5081417036), (-20.28, 0.1558112383))
            Line((-20.28, 0.1558112383), (-21.4299996157, -0.5081413494))
        make_face()
        with BuildLine():
            Line((-20.28, -5.1558112383), (-19.1300000861, -4.4918584784))
            ThreePointArc((-19.1300000861, -4.4918584784), (-20.2800000129, -4.8), (-21.4299999363, -4.4918584655))
            Line((-21.4299999363, -4.4918584655), (-20.28, -5.1558112383))
        make_face()
        with BuildLine():
            ThreePointArc((-22.58, -2.5), (-22.2718583178, -1.3499998079), (-21.4299996157, -0.5081413494))
            Line((-21.4299996157, -0.5081413494), (-22.58, -1.1720943809))
            Line((-22.58, -1.1720943809), (-22.58, -2.5))
        make_face()
        with BuildLine():
            Line((-22.58, -3.8279056191), (-21.4299999363, -4.4918584655))
            ThreePointArc((-21.4299999363, -4.4918584655), (-22.2718584103, -3.6500000318), (-22.58, -2.5))
            Line((-22.58, -2.5), (-22.58, -3.8279056191))
        make_face()
    extrude(amount=-F5_DEPTH, mode=Mode.SUBTRACT)

    # F6 (on Top) → F7 (cut)
    with BuildSketch(Plane.XY):
        with Locations((-20.28, -2.5)):
            Circle(F6_R)
        with Locations((20.28, -2.5)):
            Circle(F6_R)
    extrude(amount=F7_DEPTH, mode=Mode.SUBTRACT)

    # F8 (add): faces of the model
    f8_faces = [f1.faces().sort_by_distance(p)[0] for p in [
        (-19.98, -0.0707106781, 1.27),
        (19.98, -0.0707106781, 1.27),
    ]]
    extrude(f8_faces, amount=F8_DEPTH)


solid = f1.part
